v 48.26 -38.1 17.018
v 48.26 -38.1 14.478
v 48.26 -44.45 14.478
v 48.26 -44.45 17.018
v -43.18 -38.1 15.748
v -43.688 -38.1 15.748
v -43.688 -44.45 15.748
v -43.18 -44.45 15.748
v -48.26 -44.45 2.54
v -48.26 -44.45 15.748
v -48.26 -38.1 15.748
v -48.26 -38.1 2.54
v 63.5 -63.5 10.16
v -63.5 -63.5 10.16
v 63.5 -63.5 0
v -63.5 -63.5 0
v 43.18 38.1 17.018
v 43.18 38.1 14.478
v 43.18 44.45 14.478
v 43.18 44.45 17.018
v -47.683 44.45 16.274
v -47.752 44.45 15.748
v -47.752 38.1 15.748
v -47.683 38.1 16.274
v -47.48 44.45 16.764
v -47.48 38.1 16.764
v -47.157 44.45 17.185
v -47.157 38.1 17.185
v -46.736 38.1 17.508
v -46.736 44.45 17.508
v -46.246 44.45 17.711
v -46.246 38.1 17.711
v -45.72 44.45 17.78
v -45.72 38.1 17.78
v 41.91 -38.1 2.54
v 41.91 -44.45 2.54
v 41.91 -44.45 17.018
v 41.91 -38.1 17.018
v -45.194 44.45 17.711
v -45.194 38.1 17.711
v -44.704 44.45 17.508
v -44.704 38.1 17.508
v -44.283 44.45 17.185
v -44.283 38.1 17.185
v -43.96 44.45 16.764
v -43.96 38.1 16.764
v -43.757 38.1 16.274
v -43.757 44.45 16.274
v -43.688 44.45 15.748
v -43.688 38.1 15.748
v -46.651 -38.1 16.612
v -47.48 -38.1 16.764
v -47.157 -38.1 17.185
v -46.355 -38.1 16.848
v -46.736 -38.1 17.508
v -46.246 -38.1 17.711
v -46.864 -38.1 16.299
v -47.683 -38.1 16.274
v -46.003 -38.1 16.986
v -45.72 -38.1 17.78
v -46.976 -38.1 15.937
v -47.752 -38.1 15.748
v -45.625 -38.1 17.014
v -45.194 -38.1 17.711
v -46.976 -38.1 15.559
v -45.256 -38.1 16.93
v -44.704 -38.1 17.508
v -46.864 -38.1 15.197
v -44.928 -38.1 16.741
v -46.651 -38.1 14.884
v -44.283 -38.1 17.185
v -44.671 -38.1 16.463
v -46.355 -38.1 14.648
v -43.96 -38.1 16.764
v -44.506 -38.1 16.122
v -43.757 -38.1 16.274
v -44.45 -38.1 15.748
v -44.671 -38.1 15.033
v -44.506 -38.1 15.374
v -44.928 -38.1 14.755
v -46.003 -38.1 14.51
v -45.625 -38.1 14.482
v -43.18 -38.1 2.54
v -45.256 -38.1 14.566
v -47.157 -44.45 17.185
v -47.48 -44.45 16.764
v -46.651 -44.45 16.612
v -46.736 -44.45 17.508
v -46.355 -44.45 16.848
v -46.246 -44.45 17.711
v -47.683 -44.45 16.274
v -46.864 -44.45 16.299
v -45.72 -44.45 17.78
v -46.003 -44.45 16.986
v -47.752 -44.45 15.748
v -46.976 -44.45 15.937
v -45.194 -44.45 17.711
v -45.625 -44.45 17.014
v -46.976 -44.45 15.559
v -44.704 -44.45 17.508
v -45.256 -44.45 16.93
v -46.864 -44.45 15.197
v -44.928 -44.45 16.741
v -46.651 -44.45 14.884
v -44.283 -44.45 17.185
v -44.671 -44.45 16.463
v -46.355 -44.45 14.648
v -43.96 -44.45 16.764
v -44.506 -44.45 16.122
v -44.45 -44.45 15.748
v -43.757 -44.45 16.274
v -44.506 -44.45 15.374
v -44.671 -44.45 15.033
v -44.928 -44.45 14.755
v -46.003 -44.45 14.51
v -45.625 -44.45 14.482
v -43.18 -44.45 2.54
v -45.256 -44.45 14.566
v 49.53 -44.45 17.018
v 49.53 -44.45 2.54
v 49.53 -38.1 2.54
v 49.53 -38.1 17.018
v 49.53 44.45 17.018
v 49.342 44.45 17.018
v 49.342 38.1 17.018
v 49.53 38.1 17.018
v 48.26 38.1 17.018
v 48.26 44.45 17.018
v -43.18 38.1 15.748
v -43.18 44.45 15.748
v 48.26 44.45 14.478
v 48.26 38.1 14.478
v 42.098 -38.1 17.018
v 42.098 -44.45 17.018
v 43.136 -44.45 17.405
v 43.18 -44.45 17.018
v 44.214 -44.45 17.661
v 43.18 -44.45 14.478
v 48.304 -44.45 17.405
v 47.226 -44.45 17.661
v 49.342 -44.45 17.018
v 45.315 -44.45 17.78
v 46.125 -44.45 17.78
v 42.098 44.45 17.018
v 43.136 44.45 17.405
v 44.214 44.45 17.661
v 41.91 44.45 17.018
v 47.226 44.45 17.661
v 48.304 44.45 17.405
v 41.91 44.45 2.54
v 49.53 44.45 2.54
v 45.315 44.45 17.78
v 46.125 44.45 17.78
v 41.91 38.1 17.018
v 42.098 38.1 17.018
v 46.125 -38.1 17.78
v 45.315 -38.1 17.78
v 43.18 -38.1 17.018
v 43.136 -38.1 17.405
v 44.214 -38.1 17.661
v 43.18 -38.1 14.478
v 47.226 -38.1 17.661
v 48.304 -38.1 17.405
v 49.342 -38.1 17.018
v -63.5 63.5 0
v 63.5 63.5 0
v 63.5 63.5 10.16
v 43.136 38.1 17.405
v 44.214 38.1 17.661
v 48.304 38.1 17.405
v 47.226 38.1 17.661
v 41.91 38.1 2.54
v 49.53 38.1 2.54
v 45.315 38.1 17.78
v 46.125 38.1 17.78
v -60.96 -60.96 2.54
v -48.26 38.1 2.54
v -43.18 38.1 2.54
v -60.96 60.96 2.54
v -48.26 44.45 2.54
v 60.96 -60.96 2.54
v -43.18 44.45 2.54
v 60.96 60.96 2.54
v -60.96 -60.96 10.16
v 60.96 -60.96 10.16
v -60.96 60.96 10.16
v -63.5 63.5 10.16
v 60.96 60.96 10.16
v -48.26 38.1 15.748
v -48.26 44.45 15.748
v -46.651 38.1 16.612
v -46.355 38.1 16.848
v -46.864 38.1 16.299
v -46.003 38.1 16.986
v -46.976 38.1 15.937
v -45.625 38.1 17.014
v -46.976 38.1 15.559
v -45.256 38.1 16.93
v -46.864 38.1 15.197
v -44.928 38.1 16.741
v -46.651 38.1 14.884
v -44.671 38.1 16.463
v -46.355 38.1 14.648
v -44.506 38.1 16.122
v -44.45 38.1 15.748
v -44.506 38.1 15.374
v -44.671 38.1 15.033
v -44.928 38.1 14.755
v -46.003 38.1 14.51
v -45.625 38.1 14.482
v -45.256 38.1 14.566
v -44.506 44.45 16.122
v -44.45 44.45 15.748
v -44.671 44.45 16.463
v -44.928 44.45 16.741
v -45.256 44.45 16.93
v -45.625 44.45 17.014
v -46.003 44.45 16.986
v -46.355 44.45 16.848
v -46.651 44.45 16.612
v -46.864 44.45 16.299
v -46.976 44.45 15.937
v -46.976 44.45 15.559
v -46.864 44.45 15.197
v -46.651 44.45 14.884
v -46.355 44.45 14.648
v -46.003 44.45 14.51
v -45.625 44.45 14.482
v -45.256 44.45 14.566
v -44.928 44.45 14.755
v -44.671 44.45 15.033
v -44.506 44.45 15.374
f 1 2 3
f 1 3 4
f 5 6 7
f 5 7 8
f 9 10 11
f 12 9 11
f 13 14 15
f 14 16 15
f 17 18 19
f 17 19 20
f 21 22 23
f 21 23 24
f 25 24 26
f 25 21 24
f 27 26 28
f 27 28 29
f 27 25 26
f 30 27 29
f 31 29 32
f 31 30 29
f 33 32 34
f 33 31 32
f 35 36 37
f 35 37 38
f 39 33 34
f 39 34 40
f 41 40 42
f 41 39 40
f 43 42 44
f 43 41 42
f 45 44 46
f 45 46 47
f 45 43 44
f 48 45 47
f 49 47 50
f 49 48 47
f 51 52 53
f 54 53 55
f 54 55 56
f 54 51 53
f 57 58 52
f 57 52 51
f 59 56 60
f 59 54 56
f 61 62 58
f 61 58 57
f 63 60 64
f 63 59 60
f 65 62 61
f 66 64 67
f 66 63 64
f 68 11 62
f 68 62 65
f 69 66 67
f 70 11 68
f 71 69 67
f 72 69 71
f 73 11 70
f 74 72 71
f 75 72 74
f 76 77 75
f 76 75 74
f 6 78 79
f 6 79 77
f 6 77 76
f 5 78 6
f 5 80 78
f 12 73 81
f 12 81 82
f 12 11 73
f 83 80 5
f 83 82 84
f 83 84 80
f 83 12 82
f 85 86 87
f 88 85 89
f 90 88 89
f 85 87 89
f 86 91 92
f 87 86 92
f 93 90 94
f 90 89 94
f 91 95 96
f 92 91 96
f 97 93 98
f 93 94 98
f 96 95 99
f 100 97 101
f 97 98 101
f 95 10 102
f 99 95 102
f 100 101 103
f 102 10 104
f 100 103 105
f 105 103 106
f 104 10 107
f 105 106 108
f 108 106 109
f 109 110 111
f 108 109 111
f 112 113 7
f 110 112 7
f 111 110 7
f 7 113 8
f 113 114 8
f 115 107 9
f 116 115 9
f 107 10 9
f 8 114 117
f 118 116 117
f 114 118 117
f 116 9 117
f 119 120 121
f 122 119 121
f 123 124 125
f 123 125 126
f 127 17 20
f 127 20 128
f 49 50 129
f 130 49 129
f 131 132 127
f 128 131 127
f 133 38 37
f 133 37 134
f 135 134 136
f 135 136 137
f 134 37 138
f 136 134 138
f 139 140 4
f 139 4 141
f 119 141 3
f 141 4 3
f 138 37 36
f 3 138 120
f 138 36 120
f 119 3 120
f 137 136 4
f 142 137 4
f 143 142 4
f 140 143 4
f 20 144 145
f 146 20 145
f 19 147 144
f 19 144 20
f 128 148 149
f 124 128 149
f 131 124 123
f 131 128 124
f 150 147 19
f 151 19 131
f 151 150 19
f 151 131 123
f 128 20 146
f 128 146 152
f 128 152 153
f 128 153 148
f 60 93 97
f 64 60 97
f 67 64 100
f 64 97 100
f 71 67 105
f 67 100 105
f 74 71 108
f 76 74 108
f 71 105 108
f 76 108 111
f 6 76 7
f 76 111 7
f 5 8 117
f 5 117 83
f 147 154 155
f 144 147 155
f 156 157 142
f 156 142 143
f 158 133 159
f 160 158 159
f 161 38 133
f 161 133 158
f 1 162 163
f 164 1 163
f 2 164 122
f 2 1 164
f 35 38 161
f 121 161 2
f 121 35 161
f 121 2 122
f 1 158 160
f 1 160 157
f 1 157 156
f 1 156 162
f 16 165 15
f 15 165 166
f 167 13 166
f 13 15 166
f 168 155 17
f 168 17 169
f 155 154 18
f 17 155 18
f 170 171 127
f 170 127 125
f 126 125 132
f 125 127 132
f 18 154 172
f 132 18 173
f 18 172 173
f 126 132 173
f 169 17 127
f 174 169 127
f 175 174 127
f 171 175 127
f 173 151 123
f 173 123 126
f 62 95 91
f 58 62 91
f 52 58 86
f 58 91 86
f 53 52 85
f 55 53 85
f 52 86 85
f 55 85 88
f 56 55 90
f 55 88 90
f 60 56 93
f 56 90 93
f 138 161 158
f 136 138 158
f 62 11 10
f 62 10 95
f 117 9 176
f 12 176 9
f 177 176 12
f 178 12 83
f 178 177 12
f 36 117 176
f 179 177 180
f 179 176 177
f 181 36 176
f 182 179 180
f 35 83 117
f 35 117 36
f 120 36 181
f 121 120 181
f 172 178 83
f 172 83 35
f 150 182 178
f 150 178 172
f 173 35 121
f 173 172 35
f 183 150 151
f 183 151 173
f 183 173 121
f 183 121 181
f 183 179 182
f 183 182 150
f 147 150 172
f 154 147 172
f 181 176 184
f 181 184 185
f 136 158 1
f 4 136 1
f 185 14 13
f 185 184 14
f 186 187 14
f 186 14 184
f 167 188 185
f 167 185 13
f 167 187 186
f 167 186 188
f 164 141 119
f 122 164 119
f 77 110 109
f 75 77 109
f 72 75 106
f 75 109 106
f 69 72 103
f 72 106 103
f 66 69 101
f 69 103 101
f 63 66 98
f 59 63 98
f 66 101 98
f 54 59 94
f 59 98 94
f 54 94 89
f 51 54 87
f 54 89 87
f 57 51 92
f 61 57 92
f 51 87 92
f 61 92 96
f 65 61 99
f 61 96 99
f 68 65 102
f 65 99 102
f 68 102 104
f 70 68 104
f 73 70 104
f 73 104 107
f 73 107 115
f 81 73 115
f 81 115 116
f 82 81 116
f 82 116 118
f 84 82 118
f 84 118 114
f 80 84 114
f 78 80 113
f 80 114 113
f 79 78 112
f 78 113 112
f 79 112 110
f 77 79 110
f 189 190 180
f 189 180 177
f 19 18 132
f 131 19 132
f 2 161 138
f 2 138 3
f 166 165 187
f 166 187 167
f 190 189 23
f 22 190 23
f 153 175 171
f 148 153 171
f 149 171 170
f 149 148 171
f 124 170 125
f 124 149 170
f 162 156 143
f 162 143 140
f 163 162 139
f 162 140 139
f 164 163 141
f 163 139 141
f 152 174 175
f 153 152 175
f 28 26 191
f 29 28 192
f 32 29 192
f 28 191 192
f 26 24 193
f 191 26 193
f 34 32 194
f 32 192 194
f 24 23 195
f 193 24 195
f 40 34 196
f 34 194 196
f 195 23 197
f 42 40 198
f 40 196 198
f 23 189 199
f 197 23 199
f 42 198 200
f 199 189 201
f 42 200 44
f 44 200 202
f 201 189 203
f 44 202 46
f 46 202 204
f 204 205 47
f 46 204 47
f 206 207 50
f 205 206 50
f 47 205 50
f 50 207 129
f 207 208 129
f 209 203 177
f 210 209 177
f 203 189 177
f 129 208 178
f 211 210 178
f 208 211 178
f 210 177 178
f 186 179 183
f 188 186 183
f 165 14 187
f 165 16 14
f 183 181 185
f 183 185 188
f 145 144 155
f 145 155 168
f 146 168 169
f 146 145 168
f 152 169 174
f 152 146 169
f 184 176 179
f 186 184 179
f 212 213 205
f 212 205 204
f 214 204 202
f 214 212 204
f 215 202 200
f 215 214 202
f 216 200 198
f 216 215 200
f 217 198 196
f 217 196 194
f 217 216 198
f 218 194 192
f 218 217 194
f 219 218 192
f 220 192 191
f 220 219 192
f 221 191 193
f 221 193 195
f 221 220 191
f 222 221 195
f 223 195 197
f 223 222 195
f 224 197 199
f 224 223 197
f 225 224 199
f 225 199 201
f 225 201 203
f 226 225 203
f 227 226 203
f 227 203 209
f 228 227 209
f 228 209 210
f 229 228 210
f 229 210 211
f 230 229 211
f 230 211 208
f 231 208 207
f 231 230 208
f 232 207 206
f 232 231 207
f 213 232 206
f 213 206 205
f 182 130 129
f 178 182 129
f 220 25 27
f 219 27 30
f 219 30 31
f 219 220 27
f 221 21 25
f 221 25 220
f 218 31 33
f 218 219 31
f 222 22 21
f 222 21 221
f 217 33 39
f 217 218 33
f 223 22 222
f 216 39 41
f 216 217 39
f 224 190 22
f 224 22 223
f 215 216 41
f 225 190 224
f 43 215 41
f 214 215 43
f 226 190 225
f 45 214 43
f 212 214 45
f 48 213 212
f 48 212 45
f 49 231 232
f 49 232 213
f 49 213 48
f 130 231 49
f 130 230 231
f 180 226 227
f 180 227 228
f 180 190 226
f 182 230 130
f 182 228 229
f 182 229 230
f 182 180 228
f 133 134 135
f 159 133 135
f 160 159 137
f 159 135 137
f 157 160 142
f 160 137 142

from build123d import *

# Parameters (mm, degrees)
F0_W     = 127
F0_H     = 127
F1_DEPTH = 2.54
F2_W     = 127
F2_H     = 127
F2_W_2   = 121.92
F2_H_2   = 121.92
F3_DEPTH = 7.62
F4_W     = 5.08
F4_H     = 6.35
F4_W_2   = 7.62
F5_DEPTH = 15.24
F6_R     = 1.27
F6_W     = 5.08
F6_H     = 2.54
F7_DEPTH = 6.35


# Not quite as in the source:
# - a pattern or mirror of a feature is missing from the dataset's text; its kind, count and spacing are read off the source's solid


with BuildPart() as f1:
    # F0 (on Top) → F1 (new body)
    with BuildSketch(Plane.XY):
        Rectangle(F0_W, F0_H)
    extrude(amount=F1_DEPTH)

    # F2 (on face) → F3 (join)
    with BuildSketch(Plane.XY.offset(2.54)):
        Rectangle(F2_W, F2_H)
        Rectangle(F2_W_2, F2_H_2, mode=Mode.SUBTRACT)
    extrude(amount=F3_DEPTH)

    # F4 (on face) → F5 (join)
    with BuildSketch(Plane.XY.offset(2.54)):
        with Locations((-45.72, -41.275)):
            Rectangle(F4_W, F4_H)
        with Locations((45.72, -41.275)):
            Rectangle(F4_W_2, F4_H)
    f5 = extrude(amount=F5_DEPTH)

    # F5_copies: F5 across plane
    add(f5.mirror(Plane.ZX))

    # F6 (on face) → F7 (cut)
    with BuildSketch(Plane.XZ.offset(44.45)):
        with Locations((-45.72, 15.748)):
            Circle(F6_R)
        with Locations((45.72, 15.748)):
            Rectangle(F6_W, F6_H)
        with BuildLine():
            Line((-43.18, 17.78), (-45.72, 17.78))
            ThreePointArc((-45.72, 17.78), (-44.2831590206, 17.1848409794), (-43.688, 15.748))
            Line((-43.688, 15.748), (-43.18, 15.748))
            Line((-43.18, 15.748), (-43.18, 17.78))
        make_face()
        with BuildLine():
            ThreePointArc((-47.752, 15.748), (-47.1568409794, 17.1848409794), (-45.72, 17.78))
            Line((-45.72, 17.78), (-48.26, 17.78))
            Line((-48.26, 17.78), (-48.26, 15.748))
            Line((-48.26, 15.748), (-47.752, 15.748))
        make_face()
        with BuildLine():
            Line((49.7070066631, 17.7892204374), (45.72, 17.7892204374))
            ThreePointArc((45.72, 17.7892204374), (47.5717330447, 17.5942784861), (49.3422755435, 17.018))
            Line((49.3422755435, 17.018), (49.7070066631, 17.018))
            Line((49.7070066631, 17.018), (49.7070066631, 17.7892204374))
        make_face()
        with BuildLine():
            ThreePointArc((42.0977244565, 17.018), (43.8682669553, 17.5942784861), (45.72, 17.7892204374))
            Line((45.72, 17.7892204374), (41.827224195, 17.7892204374))
            Line((41.827224195, 17.7892204374), (41.827224195, 17.018))
            Line((41.827224195, 17.018), (42.0977244565, 17.018))
        make_face()
    f7 = extrude(amount=-F7_DEPTH, mode=Mode.SUBTRACT)

    # F7_copies: F7 across plane
    add(f7.mirror(Plane.ZX), mode=Mode.SUBTRACT)


solid = f1.part
